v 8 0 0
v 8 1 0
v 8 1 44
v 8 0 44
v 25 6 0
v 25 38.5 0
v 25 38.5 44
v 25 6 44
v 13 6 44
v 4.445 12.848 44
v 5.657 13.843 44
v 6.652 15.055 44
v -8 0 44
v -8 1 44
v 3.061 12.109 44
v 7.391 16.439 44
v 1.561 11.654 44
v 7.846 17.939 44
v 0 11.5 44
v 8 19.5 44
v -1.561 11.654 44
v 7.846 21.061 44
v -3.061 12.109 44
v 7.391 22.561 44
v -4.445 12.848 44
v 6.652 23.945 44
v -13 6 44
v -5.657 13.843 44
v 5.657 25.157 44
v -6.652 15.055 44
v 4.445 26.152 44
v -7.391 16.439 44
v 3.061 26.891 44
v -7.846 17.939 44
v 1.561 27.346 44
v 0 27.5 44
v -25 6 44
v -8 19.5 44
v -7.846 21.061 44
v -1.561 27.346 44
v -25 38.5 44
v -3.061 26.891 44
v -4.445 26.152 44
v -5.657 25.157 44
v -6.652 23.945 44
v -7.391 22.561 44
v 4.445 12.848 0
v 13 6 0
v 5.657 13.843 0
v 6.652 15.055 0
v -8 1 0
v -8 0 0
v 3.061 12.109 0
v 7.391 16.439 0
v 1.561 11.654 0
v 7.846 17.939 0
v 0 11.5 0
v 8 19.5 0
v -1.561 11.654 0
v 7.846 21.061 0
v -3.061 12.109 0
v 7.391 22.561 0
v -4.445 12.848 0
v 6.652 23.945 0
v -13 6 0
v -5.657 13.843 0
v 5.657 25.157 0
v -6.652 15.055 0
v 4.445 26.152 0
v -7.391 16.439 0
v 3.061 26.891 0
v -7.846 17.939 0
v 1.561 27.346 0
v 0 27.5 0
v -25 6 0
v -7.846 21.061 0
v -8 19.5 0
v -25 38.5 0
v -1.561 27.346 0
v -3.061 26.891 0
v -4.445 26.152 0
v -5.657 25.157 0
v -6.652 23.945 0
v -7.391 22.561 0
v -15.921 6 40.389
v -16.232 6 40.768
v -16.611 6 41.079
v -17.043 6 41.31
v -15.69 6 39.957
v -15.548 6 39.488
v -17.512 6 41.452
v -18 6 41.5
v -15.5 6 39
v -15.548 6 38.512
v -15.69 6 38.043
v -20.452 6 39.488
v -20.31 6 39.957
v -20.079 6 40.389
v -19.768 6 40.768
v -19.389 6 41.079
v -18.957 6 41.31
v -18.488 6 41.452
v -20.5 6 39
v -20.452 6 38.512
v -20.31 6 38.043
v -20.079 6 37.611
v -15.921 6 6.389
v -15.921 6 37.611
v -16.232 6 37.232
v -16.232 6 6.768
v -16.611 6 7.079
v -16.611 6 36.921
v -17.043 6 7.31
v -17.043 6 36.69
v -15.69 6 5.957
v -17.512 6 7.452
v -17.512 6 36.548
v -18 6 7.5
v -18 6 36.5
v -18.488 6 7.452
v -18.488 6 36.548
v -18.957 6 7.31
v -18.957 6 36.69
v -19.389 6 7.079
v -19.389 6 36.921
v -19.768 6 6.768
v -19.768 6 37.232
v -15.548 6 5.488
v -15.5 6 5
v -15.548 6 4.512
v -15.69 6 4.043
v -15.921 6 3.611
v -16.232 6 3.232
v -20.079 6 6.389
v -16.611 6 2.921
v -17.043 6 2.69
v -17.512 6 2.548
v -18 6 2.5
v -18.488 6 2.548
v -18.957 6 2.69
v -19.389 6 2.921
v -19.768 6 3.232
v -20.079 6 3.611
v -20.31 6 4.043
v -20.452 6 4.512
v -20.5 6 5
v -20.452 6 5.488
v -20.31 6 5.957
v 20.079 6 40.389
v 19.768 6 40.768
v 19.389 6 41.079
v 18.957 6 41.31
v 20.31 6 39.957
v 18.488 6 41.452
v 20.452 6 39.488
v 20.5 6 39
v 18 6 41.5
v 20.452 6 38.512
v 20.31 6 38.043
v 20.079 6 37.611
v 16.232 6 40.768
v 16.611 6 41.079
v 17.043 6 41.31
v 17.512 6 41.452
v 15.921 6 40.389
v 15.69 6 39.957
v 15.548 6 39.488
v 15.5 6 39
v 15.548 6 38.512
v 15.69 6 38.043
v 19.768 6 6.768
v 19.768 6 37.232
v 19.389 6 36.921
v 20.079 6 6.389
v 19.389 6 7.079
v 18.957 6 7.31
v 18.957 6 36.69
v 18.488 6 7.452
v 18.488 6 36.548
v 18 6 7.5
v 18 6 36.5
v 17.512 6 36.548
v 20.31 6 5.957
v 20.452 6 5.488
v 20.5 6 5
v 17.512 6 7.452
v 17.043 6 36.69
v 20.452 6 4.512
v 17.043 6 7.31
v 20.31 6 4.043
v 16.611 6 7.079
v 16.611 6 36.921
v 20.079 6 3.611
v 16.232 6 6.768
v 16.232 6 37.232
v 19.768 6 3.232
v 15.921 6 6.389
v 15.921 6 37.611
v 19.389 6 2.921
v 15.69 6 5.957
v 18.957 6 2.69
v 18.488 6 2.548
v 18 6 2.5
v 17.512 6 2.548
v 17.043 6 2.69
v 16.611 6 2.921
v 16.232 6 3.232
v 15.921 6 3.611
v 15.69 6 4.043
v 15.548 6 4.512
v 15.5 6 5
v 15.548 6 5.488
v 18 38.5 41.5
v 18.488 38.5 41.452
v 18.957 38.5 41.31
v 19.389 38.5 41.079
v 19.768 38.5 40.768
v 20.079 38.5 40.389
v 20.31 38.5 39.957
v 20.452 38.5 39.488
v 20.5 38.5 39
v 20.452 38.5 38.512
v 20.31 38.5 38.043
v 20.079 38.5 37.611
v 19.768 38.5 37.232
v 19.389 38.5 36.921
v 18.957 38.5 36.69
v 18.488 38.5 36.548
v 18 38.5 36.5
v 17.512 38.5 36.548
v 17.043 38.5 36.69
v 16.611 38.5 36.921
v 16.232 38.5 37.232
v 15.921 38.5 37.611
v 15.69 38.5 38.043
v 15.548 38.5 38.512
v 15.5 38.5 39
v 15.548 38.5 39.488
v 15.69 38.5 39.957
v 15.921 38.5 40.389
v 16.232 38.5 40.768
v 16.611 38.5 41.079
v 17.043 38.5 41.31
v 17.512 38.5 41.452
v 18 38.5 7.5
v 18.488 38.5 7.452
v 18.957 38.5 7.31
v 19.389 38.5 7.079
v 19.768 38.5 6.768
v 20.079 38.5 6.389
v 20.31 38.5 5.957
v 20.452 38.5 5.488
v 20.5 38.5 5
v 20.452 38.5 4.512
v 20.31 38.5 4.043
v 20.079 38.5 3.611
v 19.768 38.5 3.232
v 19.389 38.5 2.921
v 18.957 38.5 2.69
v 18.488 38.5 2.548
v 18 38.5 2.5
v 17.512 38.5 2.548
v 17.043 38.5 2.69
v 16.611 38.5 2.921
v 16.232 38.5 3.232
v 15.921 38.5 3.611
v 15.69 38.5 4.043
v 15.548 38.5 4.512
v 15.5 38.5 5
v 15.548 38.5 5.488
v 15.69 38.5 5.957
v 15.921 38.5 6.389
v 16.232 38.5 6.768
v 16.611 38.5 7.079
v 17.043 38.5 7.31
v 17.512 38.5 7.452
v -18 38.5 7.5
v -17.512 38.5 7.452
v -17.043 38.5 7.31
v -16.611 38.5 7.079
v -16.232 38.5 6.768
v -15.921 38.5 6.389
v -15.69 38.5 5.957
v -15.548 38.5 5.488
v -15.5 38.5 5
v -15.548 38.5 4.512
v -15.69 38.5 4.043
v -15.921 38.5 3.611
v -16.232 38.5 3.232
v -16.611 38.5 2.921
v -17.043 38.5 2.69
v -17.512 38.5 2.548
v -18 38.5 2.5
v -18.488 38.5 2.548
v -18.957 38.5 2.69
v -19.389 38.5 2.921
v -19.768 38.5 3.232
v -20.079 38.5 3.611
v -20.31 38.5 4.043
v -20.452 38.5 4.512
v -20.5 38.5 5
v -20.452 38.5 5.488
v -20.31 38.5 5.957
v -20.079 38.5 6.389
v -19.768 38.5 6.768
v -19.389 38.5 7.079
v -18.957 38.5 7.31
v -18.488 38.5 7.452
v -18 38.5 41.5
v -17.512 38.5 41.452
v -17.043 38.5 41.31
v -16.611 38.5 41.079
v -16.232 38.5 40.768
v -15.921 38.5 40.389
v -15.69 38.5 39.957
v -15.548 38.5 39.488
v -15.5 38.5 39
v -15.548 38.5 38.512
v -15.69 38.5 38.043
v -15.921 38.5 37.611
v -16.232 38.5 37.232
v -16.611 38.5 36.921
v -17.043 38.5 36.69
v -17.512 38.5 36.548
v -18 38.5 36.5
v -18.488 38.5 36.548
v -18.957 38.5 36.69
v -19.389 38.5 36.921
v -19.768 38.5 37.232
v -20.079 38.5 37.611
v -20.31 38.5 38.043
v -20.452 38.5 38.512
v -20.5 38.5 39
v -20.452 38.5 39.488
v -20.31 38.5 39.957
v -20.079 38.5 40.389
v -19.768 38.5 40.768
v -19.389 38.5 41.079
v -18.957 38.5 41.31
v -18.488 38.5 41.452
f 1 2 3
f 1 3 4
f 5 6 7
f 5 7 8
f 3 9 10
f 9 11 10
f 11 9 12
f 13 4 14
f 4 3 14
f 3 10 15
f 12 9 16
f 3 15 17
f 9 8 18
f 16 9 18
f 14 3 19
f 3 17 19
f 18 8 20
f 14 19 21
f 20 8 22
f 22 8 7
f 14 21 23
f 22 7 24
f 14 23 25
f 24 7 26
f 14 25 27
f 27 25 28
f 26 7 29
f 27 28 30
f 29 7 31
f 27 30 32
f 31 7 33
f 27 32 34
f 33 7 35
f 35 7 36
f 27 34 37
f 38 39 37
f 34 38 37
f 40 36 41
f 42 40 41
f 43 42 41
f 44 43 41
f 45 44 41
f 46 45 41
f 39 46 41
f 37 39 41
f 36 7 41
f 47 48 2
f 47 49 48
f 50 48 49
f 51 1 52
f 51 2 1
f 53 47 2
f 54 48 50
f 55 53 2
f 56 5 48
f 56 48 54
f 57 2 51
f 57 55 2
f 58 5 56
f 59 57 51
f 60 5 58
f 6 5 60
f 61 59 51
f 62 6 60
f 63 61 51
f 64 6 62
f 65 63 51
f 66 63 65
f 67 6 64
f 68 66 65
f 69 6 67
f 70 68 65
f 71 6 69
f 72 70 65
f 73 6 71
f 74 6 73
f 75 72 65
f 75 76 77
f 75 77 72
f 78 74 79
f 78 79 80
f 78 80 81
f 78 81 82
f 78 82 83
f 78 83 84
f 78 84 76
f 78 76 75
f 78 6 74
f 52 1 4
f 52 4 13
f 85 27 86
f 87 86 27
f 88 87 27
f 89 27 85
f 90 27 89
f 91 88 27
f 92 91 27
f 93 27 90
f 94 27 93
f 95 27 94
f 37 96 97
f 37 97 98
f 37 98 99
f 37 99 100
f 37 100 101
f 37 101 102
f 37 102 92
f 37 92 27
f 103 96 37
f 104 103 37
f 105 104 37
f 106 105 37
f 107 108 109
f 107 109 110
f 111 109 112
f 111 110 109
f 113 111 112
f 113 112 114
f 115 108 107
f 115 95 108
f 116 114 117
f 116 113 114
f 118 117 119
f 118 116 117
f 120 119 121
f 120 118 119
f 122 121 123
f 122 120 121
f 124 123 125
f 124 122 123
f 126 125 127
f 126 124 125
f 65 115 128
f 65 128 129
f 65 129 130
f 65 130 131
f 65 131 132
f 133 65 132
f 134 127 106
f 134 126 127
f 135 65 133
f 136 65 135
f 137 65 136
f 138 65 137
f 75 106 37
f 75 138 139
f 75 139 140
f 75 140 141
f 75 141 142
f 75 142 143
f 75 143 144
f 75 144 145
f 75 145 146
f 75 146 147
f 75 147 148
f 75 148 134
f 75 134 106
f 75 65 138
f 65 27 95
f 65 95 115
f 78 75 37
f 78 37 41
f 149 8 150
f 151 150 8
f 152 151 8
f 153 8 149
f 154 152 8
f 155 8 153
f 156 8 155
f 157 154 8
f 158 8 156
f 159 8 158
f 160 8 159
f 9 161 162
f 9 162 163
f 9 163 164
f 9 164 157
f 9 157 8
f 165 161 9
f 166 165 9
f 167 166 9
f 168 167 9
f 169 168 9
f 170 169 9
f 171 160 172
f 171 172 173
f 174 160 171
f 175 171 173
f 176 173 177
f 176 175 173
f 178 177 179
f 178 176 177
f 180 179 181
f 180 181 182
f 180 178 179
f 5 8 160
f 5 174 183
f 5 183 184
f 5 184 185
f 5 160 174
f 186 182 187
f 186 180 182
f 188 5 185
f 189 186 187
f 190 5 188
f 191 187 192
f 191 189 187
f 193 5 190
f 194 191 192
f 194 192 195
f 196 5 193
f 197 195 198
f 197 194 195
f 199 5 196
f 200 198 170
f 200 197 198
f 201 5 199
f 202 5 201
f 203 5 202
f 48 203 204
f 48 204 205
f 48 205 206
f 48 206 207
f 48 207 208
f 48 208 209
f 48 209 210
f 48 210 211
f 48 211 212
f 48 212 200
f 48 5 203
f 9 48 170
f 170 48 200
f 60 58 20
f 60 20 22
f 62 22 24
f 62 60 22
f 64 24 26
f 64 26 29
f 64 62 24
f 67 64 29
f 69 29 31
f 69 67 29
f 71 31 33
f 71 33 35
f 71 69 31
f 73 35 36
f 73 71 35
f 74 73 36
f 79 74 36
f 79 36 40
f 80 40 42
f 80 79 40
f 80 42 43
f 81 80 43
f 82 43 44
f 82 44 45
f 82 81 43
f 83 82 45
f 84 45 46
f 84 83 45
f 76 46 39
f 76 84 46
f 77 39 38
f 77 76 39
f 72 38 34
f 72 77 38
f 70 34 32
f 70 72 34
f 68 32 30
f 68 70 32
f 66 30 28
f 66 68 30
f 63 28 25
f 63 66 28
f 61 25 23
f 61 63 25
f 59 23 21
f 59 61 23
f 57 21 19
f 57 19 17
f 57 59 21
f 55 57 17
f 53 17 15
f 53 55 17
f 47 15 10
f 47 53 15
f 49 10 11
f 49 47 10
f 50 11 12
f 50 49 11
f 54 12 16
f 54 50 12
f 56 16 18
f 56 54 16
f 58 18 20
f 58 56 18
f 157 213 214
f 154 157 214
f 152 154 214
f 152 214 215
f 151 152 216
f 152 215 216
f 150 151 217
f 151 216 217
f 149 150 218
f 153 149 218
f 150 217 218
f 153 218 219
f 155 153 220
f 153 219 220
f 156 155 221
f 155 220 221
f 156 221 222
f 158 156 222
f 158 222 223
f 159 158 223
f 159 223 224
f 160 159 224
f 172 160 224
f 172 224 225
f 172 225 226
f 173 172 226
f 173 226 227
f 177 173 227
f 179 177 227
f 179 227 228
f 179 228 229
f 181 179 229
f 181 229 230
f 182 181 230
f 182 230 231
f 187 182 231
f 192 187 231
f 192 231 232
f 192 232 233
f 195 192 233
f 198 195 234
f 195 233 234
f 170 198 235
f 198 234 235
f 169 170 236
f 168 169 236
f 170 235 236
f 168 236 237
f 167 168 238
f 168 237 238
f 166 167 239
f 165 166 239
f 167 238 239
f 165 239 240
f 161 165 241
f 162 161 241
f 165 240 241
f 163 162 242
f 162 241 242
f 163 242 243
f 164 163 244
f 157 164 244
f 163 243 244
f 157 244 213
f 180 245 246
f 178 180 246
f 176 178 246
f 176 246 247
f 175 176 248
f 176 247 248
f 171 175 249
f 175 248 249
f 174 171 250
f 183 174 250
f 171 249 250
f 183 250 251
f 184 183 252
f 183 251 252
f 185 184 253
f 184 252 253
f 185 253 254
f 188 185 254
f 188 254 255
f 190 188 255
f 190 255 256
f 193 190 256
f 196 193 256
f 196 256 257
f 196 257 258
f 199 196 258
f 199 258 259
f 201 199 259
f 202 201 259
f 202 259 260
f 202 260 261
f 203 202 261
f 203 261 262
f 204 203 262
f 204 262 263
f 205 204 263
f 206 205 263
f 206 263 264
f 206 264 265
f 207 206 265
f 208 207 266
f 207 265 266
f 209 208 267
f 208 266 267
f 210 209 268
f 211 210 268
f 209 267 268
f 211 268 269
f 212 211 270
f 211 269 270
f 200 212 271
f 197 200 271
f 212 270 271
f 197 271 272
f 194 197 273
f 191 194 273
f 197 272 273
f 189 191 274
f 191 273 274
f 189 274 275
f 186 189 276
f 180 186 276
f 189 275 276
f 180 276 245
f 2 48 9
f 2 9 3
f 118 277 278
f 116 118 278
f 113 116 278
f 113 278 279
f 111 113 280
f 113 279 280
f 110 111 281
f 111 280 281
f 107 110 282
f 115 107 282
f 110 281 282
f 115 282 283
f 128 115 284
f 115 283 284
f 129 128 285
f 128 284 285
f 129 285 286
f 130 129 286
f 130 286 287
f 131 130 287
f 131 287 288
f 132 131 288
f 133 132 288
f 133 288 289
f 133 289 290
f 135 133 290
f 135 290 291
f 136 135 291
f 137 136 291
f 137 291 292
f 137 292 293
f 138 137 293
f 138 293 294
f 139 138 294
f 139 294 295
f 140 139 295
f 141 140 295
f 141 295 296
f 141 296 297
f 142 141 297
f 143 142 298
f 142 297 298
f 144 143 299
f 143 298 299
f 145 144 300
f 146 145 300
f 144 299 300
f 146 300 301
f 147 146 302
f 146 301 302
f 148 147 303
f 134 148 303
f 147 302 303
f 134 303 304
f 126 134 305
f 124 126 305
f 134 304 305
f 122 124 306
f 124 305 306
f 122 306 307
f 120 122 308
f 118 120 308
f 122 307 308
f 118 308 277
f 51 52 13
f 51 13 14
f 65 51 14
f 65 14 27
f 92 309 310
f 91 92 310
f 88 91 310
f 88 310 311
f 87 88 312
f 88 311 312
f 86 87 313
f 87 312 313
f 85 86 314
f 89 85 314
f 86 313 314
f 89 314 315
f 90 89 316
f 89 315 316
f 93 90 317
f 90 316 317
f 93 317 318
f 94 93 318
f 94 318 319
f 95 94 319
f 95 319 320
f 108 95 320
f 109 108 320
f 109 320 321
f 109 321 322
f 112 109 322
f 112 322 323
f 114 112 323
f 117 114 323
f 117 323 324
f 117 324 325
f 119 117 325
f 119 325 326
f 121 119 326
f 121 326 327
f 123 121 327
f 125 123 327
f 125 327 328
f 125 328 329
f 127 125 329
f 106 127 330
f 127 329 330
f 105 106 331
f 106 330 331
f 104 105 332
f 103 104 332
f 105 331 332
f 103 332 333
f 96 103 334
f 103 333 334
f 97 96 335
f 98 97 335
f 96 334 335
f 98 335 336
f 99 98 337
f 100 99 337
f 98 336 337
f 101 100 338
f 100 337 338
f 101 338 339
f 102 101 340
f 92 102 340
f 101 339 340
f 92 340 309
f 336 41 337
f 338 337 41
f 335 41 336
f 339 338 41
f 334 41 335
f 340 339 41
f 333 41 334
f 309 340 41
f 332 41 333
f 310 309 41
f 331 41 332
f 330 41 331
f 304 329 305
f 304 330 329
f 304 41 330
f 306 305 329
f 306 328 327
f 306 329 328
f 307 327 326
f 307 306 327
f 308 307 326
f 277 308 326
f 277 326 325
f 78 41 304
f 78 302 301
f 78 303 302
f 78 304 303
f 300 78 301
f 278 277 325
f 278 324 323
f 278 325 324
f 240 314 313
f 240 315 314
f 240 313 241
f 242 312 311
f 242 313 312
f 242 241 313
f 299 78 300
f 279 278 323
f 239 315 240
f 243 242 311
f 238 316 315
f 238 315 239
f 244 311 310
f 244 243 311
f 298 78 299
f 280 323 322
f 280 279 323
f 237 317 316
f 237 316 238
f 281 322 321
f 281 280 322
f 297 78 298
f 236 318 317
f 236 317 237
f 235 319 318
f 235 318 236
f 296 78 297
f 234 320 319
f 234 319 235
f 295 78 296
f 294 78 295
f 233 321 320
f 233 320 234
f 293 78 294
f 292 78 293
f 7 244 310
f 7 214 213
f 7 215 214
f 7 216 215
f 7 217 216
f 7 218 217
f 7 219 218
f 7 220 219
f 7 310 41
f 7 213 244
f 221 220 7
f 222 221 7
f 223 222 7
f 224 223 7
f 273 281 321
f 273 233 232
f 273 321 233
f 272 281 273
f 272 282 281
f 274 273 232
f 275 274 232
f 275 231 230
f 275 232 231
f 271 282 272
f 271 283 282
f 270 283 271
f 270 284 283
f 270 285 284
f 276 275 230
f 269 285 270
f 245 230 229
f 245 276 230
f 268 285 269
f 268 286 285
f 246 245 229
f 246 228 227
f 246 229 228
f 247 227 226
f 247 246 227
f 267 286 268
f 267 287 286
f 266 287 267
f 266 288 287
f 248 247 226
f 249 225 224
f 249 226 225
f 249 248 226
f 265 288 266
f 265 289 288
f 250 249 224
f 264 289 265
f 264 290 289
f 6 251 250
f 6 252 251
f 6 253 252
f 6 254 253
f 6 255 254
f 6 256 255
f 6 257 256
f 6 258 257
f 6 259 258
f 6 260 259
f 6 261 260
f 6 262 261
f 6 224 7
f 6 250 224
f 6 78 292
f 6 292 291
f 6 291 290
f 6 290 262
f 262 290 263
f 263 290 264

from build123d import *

# Parameters (mm, degrees)
SKETCH_1_R          = 8
EXTRUDE_1_DEPTH     = 44
SKETCH_2_R          = 2.5
CUT_EXTRUDE_1_DEPTH = 64.586555183


with BuildPart() as part:
    # 草图1 → 凸台-拉伸1 (new body)
    with BuildSketch(Plane.XY):
        Polygon((8, 0), (-8, 0), (-8, 1), (-13, 6), (-25, 6), (-25, 38.5), (25, 38.5), (25, 6), (13, 6), (8, 1), align=None)
        with Locations((0, 19.5)):
            Circle(SKETCH_1_R, mode=Mode.SUBTRACT)
    extrude(amount=EXTRUDE_1_DEPTH)

    # 草图2 → 切除-拉伸1 (cut, through all)
    with BuildSketch(Plane(origin=(0, 38.5, 0), x_dir=(1, 0, 0), z_dir=(0, 1, 0))):
        with Locations(Location((-18, -5, 0), (0, 0, 270))):
            Circle(SKETCH_2_R)
        with Locations(Location((18, -5, 0), (0, 0, 270))):
            Circle(SKETCH_2_R)
        with Locations(Location((18, -39, 0), (0, 0, 270))):
            Circle(SKETCH_2_R)
        with Locations(Location((-18, -39, 0), (0, 0, 270))):
            Circle(SKETCH_2_R)
    extrude(amount=-CUT_EXTRUDE_1_DEPTH, mode=Mode.SUBTRACT)


solid = part.part
